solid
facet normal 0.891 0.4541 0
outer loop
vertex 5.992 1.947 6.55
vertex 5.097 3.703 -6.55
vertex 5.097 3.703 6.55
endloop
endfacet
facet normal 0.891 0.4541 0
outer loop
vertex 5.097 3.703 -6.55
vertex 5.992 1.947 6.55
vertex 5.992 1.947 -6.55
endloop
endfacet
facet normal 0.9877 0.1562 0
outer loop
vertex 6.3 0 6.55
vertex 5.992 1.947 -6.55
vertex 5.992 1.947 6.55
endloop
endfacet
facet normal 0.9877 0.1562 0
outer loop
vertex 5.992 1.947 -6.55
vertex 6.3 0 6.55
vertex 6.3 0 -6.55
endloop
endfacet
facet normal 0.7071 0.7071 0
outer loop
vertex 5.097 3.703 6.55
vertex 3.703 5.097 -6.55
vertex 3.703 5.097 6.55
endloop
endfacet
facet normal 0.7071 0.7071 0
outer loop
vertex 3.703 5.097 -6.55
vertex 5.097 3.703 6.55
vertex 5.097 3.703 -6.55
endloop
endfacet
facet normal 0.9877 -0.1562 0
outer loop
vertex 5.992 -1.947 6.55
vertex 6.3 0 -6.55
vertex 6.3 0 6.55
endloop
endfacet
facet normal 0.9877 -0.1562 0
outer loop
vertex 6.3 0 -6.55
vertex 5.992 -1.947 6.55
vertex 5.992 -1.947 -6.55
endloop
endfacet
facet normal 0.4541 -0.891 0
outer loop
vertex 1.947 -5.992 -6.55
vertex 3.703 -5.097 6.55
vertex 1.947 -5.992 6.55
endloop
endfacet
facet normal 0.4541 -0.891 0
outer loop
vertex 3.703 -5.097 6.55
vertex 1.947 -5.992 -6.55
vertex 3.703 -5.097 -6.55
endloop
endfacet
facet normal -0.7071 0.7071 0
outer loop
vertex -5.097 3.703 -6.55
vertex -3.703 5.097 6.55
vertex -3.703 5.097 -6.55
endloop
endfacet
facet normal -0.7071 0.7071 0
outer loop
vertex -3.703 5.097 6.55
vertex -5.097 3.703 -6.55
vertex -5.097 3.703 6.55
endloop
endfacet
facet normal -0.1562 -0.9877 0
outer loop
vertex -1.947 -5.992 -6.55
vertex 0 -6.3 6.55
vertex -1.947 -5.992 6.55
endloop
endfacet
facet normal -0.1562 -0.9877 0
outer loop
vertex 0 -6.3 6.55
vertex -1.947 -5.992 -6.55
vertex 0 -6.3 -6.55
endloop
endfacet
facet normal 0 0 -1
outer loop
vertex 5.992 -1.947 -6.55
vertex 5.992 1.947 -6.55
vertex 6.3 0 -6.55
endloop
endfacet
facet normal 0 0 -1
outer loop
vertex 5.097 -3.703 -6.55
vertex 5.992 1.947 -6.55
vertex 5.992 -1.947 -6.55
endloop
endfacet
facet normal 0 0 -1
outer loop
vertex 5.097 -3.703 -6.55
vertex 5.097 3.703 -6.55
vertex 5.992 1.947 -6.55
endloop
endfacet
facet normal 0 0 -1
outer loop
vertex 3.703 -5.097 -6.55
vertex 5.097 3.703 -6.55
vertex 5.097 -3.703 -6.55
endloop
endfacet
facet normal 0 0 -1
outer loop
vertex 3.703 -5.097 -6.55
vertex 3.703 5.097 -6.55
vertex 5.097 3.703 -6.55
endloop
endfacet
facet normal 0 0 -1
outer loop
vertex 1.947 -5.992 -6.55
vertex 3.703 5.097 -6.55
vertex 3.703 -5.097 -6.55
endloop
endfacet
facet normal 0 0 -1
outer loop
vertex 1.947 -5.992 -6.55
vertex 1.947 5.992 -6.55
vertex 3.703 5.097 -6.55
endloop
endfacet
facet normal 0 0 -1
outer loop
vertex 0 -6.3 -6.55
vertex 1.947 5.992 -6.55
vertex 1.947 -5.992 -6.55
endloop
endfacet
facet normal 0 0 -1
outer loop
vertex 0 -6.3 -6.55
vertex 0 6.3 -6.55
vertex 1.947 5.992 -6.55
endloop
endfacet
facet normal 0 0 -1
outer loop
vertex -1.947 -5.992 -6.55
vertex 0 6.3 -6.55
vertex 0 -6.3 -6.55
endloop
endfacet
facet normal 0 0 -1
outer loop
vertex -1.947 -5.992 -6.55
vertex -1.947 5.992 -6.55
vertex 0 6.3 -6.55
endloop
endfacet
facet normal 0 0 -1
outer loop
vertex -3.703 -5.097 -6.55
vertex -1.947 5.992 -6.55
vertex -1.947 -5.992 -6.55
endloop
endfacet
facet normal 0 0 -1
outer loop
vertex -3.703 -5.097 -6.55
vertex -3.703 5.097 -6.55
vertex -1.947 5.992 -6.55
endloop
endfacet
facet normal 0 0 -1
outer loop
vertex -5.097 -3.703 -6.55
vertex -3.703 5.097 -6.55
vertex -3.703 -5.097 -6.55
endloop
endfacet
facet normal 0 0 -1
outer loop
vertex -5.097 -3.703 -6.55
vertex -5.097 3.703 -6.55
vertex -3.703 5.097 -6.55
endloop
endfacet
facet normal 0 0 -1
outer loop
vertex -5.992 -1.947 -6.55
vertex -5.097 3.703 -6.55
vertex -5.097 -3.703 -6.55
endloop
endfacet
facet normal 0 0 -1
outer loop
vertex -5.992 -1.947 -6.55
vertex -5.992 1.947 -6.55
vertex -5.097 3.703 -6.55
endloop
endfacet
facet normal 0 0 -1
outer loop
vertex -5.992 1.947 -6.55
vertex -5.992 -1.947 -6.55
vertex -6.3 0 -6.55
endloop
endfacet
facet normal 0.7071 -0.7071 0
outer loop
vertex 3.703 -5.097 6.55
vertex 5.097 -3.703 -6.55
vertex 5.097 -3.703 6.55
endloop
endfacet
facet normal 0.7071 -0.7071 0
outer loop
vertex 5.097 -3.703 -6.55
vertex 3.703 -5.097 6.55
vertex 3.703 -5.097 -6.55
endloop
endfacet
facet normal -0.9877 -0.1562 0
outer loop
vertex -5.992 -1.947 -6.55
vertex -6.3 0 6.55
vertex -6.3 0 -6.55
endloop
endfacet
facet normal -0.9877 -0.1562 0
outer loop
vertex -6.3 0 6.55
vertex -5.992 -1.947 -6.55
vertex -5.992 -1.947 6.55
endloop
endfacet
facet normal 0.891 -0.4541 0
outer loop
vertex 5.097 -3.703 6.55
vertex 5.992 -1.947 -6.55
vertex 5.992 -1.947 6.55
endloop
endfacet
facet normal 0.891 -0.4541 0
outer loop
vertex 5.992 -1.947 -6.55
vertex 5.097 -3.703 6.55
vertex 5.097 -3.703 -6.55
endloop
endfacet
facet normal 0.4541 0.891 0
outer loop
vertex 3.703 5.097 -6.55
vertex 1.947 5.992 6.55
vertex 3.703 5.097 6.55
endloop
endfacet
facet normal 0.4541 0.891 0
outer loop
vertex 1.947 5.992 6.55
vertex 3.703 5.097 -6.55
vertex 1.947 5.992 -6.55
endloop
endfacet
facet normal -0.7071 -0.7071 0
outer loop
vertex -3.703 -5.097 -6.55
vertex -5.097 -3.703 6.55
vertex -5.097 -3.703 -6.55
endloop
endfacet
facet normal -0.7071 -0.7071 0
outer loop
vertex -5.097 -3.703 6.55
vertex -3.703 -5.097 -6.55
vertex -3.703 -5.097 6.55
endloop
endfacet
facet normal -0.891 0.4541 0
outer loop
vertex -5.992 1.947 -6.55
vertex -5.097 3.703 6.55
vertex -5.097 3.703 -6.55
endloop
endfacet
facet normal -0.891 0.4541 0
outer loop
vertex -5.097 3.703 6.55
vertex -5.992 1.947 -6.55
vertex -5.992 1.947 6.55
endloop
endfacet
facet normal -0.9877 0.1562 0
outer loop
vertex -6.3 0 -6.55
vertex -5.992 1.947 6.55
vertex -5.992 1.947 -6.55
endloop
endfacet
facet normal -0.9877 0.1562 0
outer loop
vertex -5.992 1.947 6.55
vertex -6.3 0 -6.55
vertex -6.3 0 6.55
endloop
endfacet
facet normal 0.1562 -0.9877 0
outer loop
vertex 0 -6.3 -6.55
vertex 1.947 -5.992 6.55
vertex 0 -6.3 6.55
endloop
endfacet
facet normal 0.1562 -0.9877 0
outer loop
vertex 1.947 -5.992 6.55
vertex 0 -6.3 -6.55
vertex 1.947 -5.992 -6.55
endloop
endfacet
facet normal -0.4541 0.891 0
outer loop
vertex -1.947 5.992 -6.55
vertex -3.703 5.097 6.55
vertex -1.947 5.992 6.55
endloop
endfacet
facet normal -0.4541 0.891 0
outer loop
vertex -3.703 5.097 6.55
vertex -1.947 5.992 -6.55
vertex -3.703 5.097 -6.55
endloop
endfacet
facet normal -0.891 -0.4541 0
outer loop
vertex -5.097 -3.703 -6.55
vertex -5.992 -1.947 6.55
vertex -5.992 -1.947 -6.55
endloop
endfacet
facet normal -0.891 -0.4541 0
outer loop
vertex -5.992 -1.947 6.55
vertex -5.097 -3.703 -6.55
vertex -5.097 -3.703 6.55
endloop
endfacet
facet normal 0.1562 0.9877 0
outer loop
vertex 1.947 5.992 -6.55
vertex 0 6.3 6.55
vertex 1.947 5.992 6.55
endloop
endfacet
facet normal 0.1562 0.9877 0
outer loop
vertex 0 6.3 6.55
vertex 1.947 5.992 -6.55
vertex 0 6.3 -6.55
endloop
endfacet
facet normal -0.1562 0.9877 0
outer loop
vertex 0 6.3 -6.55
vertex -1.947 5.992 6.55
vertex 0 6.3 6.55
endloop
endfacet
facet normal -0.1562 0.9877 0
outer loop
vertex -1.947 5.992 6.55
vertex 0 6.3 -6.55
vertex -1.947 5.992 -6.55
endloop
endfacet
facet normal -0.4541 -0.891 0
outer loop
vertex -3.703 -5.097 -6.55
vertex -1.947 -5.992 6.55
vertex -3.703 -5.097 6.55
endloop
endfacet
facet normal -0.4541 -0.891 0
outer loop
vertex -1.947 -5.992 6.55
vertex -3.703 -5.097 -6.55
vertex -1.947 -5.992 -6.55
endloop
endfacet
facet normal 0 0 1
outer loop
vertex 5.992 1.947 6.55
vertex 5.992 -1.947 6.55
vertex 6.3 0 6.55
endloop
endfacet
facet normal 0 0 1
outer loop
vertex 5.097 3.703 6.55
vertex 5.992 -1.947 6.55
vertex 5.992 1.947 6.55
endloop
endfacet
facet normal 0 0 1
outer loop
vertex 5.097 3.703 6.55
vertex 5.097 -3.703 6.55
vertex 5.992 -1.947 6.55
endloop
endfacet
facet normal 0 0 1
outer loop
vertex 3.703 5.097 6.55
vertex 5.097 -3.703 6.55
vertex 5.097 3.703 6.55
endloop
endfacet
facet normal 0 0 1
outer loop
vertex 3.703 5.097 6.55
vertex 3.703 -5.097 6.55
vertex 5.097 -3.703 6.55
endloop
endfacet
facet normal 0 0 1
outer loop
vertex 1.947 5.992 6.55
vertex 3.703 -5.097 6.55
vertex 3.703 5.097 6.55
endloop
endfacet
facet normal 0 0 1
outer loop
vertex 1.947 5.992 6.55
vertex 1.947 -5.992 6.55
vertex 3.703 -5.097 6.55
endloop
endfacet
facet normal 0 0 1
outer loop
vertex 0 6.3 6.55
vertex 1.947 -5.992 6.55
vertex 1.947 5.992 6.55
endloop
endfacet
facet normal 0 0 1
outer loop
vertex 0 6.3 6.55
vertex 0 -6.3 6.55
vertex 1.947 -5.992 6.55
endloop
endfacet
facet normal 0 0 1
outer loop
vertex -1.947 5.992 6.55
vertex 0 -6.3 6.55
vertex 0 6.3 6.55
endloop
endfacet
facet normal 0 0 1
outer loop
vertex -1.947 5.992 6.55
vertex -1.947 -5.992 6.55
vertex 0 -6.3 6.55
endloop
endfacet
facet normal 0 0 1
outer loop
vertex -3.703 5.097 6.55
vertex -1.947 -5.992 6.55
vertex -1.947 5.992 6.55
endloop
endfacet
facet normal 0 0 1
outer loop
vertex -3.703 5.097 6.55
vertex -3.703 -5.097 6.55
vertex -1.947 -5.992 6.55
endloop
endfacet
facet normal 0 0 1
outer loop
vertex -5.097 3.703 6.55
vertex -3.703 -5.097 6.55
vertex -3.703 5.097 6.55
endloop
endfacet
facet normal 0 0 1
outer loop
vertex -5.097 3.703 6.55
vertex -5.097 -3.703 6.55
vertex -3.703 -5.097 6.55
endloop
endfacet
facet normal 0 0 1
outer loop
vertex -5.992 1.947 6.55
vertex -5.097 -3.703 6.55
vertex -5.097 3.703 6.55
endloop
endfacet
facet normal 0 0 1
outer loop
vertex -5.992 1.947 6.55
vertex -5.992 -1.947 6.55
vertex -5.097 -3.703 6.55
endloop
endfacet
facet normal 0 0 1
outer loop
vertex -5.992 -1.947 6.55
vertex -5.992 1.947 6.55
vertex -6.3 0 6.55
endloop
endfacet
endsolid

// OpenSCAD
// Parameters
body_diameter_mm = 12.6; //[6.3:25.2:0.1]
body_height_mm = 13.1; //[6.55:26.2:0.1]
centered = 1; //[0:1:1]
include_toggle_lever = 0; //[0:1:1]
face_thickness_mm = 0.6; //[0.3:1.2:0.1]
overlap_mm = 0.8; //[0.5:2:0.1]
toggle_diameter_mm = 4; //[2:8:0.1]
toggle_height_mm = 10; //[5:20:0.5]

// Toggle switch body
module switch_body() {
  color("DimGray") {
    // Main cylindrical body
    cylinder(h=body_height_mm, r=body_diameter_mm/2, center=true);
    
    // Top face
    translate([0, 0, body_height_mm/2 - face_thickness_mm/2 - overlap_mm/2])
      cylinder(h=face_thickness_mm, r=body_diameter_mm/2, center=true);
    
    // Bottom face
    translate([0, 0, -body_height_mm/2 + face_thickness_mm/2 + overlap_mm/2])
      cylinder(h=face_thickness_mm, r=body_diameter_mm/2, center=true);
  }
}

// Toggle lever
module toggle() {
  if (include_toggle_lever) {
    color("Silver") {
      translate([0, 0, body_height_mm/2 + toggle_height_mm/2 - overlap_mm])
        cylinder(h=toggle_height_mm, r=toggle_diameter_mm/2, center=true);
    }
  }
}

// Assembly
module assembly() {
  switch_body();
  toggle();
}

assembly();
